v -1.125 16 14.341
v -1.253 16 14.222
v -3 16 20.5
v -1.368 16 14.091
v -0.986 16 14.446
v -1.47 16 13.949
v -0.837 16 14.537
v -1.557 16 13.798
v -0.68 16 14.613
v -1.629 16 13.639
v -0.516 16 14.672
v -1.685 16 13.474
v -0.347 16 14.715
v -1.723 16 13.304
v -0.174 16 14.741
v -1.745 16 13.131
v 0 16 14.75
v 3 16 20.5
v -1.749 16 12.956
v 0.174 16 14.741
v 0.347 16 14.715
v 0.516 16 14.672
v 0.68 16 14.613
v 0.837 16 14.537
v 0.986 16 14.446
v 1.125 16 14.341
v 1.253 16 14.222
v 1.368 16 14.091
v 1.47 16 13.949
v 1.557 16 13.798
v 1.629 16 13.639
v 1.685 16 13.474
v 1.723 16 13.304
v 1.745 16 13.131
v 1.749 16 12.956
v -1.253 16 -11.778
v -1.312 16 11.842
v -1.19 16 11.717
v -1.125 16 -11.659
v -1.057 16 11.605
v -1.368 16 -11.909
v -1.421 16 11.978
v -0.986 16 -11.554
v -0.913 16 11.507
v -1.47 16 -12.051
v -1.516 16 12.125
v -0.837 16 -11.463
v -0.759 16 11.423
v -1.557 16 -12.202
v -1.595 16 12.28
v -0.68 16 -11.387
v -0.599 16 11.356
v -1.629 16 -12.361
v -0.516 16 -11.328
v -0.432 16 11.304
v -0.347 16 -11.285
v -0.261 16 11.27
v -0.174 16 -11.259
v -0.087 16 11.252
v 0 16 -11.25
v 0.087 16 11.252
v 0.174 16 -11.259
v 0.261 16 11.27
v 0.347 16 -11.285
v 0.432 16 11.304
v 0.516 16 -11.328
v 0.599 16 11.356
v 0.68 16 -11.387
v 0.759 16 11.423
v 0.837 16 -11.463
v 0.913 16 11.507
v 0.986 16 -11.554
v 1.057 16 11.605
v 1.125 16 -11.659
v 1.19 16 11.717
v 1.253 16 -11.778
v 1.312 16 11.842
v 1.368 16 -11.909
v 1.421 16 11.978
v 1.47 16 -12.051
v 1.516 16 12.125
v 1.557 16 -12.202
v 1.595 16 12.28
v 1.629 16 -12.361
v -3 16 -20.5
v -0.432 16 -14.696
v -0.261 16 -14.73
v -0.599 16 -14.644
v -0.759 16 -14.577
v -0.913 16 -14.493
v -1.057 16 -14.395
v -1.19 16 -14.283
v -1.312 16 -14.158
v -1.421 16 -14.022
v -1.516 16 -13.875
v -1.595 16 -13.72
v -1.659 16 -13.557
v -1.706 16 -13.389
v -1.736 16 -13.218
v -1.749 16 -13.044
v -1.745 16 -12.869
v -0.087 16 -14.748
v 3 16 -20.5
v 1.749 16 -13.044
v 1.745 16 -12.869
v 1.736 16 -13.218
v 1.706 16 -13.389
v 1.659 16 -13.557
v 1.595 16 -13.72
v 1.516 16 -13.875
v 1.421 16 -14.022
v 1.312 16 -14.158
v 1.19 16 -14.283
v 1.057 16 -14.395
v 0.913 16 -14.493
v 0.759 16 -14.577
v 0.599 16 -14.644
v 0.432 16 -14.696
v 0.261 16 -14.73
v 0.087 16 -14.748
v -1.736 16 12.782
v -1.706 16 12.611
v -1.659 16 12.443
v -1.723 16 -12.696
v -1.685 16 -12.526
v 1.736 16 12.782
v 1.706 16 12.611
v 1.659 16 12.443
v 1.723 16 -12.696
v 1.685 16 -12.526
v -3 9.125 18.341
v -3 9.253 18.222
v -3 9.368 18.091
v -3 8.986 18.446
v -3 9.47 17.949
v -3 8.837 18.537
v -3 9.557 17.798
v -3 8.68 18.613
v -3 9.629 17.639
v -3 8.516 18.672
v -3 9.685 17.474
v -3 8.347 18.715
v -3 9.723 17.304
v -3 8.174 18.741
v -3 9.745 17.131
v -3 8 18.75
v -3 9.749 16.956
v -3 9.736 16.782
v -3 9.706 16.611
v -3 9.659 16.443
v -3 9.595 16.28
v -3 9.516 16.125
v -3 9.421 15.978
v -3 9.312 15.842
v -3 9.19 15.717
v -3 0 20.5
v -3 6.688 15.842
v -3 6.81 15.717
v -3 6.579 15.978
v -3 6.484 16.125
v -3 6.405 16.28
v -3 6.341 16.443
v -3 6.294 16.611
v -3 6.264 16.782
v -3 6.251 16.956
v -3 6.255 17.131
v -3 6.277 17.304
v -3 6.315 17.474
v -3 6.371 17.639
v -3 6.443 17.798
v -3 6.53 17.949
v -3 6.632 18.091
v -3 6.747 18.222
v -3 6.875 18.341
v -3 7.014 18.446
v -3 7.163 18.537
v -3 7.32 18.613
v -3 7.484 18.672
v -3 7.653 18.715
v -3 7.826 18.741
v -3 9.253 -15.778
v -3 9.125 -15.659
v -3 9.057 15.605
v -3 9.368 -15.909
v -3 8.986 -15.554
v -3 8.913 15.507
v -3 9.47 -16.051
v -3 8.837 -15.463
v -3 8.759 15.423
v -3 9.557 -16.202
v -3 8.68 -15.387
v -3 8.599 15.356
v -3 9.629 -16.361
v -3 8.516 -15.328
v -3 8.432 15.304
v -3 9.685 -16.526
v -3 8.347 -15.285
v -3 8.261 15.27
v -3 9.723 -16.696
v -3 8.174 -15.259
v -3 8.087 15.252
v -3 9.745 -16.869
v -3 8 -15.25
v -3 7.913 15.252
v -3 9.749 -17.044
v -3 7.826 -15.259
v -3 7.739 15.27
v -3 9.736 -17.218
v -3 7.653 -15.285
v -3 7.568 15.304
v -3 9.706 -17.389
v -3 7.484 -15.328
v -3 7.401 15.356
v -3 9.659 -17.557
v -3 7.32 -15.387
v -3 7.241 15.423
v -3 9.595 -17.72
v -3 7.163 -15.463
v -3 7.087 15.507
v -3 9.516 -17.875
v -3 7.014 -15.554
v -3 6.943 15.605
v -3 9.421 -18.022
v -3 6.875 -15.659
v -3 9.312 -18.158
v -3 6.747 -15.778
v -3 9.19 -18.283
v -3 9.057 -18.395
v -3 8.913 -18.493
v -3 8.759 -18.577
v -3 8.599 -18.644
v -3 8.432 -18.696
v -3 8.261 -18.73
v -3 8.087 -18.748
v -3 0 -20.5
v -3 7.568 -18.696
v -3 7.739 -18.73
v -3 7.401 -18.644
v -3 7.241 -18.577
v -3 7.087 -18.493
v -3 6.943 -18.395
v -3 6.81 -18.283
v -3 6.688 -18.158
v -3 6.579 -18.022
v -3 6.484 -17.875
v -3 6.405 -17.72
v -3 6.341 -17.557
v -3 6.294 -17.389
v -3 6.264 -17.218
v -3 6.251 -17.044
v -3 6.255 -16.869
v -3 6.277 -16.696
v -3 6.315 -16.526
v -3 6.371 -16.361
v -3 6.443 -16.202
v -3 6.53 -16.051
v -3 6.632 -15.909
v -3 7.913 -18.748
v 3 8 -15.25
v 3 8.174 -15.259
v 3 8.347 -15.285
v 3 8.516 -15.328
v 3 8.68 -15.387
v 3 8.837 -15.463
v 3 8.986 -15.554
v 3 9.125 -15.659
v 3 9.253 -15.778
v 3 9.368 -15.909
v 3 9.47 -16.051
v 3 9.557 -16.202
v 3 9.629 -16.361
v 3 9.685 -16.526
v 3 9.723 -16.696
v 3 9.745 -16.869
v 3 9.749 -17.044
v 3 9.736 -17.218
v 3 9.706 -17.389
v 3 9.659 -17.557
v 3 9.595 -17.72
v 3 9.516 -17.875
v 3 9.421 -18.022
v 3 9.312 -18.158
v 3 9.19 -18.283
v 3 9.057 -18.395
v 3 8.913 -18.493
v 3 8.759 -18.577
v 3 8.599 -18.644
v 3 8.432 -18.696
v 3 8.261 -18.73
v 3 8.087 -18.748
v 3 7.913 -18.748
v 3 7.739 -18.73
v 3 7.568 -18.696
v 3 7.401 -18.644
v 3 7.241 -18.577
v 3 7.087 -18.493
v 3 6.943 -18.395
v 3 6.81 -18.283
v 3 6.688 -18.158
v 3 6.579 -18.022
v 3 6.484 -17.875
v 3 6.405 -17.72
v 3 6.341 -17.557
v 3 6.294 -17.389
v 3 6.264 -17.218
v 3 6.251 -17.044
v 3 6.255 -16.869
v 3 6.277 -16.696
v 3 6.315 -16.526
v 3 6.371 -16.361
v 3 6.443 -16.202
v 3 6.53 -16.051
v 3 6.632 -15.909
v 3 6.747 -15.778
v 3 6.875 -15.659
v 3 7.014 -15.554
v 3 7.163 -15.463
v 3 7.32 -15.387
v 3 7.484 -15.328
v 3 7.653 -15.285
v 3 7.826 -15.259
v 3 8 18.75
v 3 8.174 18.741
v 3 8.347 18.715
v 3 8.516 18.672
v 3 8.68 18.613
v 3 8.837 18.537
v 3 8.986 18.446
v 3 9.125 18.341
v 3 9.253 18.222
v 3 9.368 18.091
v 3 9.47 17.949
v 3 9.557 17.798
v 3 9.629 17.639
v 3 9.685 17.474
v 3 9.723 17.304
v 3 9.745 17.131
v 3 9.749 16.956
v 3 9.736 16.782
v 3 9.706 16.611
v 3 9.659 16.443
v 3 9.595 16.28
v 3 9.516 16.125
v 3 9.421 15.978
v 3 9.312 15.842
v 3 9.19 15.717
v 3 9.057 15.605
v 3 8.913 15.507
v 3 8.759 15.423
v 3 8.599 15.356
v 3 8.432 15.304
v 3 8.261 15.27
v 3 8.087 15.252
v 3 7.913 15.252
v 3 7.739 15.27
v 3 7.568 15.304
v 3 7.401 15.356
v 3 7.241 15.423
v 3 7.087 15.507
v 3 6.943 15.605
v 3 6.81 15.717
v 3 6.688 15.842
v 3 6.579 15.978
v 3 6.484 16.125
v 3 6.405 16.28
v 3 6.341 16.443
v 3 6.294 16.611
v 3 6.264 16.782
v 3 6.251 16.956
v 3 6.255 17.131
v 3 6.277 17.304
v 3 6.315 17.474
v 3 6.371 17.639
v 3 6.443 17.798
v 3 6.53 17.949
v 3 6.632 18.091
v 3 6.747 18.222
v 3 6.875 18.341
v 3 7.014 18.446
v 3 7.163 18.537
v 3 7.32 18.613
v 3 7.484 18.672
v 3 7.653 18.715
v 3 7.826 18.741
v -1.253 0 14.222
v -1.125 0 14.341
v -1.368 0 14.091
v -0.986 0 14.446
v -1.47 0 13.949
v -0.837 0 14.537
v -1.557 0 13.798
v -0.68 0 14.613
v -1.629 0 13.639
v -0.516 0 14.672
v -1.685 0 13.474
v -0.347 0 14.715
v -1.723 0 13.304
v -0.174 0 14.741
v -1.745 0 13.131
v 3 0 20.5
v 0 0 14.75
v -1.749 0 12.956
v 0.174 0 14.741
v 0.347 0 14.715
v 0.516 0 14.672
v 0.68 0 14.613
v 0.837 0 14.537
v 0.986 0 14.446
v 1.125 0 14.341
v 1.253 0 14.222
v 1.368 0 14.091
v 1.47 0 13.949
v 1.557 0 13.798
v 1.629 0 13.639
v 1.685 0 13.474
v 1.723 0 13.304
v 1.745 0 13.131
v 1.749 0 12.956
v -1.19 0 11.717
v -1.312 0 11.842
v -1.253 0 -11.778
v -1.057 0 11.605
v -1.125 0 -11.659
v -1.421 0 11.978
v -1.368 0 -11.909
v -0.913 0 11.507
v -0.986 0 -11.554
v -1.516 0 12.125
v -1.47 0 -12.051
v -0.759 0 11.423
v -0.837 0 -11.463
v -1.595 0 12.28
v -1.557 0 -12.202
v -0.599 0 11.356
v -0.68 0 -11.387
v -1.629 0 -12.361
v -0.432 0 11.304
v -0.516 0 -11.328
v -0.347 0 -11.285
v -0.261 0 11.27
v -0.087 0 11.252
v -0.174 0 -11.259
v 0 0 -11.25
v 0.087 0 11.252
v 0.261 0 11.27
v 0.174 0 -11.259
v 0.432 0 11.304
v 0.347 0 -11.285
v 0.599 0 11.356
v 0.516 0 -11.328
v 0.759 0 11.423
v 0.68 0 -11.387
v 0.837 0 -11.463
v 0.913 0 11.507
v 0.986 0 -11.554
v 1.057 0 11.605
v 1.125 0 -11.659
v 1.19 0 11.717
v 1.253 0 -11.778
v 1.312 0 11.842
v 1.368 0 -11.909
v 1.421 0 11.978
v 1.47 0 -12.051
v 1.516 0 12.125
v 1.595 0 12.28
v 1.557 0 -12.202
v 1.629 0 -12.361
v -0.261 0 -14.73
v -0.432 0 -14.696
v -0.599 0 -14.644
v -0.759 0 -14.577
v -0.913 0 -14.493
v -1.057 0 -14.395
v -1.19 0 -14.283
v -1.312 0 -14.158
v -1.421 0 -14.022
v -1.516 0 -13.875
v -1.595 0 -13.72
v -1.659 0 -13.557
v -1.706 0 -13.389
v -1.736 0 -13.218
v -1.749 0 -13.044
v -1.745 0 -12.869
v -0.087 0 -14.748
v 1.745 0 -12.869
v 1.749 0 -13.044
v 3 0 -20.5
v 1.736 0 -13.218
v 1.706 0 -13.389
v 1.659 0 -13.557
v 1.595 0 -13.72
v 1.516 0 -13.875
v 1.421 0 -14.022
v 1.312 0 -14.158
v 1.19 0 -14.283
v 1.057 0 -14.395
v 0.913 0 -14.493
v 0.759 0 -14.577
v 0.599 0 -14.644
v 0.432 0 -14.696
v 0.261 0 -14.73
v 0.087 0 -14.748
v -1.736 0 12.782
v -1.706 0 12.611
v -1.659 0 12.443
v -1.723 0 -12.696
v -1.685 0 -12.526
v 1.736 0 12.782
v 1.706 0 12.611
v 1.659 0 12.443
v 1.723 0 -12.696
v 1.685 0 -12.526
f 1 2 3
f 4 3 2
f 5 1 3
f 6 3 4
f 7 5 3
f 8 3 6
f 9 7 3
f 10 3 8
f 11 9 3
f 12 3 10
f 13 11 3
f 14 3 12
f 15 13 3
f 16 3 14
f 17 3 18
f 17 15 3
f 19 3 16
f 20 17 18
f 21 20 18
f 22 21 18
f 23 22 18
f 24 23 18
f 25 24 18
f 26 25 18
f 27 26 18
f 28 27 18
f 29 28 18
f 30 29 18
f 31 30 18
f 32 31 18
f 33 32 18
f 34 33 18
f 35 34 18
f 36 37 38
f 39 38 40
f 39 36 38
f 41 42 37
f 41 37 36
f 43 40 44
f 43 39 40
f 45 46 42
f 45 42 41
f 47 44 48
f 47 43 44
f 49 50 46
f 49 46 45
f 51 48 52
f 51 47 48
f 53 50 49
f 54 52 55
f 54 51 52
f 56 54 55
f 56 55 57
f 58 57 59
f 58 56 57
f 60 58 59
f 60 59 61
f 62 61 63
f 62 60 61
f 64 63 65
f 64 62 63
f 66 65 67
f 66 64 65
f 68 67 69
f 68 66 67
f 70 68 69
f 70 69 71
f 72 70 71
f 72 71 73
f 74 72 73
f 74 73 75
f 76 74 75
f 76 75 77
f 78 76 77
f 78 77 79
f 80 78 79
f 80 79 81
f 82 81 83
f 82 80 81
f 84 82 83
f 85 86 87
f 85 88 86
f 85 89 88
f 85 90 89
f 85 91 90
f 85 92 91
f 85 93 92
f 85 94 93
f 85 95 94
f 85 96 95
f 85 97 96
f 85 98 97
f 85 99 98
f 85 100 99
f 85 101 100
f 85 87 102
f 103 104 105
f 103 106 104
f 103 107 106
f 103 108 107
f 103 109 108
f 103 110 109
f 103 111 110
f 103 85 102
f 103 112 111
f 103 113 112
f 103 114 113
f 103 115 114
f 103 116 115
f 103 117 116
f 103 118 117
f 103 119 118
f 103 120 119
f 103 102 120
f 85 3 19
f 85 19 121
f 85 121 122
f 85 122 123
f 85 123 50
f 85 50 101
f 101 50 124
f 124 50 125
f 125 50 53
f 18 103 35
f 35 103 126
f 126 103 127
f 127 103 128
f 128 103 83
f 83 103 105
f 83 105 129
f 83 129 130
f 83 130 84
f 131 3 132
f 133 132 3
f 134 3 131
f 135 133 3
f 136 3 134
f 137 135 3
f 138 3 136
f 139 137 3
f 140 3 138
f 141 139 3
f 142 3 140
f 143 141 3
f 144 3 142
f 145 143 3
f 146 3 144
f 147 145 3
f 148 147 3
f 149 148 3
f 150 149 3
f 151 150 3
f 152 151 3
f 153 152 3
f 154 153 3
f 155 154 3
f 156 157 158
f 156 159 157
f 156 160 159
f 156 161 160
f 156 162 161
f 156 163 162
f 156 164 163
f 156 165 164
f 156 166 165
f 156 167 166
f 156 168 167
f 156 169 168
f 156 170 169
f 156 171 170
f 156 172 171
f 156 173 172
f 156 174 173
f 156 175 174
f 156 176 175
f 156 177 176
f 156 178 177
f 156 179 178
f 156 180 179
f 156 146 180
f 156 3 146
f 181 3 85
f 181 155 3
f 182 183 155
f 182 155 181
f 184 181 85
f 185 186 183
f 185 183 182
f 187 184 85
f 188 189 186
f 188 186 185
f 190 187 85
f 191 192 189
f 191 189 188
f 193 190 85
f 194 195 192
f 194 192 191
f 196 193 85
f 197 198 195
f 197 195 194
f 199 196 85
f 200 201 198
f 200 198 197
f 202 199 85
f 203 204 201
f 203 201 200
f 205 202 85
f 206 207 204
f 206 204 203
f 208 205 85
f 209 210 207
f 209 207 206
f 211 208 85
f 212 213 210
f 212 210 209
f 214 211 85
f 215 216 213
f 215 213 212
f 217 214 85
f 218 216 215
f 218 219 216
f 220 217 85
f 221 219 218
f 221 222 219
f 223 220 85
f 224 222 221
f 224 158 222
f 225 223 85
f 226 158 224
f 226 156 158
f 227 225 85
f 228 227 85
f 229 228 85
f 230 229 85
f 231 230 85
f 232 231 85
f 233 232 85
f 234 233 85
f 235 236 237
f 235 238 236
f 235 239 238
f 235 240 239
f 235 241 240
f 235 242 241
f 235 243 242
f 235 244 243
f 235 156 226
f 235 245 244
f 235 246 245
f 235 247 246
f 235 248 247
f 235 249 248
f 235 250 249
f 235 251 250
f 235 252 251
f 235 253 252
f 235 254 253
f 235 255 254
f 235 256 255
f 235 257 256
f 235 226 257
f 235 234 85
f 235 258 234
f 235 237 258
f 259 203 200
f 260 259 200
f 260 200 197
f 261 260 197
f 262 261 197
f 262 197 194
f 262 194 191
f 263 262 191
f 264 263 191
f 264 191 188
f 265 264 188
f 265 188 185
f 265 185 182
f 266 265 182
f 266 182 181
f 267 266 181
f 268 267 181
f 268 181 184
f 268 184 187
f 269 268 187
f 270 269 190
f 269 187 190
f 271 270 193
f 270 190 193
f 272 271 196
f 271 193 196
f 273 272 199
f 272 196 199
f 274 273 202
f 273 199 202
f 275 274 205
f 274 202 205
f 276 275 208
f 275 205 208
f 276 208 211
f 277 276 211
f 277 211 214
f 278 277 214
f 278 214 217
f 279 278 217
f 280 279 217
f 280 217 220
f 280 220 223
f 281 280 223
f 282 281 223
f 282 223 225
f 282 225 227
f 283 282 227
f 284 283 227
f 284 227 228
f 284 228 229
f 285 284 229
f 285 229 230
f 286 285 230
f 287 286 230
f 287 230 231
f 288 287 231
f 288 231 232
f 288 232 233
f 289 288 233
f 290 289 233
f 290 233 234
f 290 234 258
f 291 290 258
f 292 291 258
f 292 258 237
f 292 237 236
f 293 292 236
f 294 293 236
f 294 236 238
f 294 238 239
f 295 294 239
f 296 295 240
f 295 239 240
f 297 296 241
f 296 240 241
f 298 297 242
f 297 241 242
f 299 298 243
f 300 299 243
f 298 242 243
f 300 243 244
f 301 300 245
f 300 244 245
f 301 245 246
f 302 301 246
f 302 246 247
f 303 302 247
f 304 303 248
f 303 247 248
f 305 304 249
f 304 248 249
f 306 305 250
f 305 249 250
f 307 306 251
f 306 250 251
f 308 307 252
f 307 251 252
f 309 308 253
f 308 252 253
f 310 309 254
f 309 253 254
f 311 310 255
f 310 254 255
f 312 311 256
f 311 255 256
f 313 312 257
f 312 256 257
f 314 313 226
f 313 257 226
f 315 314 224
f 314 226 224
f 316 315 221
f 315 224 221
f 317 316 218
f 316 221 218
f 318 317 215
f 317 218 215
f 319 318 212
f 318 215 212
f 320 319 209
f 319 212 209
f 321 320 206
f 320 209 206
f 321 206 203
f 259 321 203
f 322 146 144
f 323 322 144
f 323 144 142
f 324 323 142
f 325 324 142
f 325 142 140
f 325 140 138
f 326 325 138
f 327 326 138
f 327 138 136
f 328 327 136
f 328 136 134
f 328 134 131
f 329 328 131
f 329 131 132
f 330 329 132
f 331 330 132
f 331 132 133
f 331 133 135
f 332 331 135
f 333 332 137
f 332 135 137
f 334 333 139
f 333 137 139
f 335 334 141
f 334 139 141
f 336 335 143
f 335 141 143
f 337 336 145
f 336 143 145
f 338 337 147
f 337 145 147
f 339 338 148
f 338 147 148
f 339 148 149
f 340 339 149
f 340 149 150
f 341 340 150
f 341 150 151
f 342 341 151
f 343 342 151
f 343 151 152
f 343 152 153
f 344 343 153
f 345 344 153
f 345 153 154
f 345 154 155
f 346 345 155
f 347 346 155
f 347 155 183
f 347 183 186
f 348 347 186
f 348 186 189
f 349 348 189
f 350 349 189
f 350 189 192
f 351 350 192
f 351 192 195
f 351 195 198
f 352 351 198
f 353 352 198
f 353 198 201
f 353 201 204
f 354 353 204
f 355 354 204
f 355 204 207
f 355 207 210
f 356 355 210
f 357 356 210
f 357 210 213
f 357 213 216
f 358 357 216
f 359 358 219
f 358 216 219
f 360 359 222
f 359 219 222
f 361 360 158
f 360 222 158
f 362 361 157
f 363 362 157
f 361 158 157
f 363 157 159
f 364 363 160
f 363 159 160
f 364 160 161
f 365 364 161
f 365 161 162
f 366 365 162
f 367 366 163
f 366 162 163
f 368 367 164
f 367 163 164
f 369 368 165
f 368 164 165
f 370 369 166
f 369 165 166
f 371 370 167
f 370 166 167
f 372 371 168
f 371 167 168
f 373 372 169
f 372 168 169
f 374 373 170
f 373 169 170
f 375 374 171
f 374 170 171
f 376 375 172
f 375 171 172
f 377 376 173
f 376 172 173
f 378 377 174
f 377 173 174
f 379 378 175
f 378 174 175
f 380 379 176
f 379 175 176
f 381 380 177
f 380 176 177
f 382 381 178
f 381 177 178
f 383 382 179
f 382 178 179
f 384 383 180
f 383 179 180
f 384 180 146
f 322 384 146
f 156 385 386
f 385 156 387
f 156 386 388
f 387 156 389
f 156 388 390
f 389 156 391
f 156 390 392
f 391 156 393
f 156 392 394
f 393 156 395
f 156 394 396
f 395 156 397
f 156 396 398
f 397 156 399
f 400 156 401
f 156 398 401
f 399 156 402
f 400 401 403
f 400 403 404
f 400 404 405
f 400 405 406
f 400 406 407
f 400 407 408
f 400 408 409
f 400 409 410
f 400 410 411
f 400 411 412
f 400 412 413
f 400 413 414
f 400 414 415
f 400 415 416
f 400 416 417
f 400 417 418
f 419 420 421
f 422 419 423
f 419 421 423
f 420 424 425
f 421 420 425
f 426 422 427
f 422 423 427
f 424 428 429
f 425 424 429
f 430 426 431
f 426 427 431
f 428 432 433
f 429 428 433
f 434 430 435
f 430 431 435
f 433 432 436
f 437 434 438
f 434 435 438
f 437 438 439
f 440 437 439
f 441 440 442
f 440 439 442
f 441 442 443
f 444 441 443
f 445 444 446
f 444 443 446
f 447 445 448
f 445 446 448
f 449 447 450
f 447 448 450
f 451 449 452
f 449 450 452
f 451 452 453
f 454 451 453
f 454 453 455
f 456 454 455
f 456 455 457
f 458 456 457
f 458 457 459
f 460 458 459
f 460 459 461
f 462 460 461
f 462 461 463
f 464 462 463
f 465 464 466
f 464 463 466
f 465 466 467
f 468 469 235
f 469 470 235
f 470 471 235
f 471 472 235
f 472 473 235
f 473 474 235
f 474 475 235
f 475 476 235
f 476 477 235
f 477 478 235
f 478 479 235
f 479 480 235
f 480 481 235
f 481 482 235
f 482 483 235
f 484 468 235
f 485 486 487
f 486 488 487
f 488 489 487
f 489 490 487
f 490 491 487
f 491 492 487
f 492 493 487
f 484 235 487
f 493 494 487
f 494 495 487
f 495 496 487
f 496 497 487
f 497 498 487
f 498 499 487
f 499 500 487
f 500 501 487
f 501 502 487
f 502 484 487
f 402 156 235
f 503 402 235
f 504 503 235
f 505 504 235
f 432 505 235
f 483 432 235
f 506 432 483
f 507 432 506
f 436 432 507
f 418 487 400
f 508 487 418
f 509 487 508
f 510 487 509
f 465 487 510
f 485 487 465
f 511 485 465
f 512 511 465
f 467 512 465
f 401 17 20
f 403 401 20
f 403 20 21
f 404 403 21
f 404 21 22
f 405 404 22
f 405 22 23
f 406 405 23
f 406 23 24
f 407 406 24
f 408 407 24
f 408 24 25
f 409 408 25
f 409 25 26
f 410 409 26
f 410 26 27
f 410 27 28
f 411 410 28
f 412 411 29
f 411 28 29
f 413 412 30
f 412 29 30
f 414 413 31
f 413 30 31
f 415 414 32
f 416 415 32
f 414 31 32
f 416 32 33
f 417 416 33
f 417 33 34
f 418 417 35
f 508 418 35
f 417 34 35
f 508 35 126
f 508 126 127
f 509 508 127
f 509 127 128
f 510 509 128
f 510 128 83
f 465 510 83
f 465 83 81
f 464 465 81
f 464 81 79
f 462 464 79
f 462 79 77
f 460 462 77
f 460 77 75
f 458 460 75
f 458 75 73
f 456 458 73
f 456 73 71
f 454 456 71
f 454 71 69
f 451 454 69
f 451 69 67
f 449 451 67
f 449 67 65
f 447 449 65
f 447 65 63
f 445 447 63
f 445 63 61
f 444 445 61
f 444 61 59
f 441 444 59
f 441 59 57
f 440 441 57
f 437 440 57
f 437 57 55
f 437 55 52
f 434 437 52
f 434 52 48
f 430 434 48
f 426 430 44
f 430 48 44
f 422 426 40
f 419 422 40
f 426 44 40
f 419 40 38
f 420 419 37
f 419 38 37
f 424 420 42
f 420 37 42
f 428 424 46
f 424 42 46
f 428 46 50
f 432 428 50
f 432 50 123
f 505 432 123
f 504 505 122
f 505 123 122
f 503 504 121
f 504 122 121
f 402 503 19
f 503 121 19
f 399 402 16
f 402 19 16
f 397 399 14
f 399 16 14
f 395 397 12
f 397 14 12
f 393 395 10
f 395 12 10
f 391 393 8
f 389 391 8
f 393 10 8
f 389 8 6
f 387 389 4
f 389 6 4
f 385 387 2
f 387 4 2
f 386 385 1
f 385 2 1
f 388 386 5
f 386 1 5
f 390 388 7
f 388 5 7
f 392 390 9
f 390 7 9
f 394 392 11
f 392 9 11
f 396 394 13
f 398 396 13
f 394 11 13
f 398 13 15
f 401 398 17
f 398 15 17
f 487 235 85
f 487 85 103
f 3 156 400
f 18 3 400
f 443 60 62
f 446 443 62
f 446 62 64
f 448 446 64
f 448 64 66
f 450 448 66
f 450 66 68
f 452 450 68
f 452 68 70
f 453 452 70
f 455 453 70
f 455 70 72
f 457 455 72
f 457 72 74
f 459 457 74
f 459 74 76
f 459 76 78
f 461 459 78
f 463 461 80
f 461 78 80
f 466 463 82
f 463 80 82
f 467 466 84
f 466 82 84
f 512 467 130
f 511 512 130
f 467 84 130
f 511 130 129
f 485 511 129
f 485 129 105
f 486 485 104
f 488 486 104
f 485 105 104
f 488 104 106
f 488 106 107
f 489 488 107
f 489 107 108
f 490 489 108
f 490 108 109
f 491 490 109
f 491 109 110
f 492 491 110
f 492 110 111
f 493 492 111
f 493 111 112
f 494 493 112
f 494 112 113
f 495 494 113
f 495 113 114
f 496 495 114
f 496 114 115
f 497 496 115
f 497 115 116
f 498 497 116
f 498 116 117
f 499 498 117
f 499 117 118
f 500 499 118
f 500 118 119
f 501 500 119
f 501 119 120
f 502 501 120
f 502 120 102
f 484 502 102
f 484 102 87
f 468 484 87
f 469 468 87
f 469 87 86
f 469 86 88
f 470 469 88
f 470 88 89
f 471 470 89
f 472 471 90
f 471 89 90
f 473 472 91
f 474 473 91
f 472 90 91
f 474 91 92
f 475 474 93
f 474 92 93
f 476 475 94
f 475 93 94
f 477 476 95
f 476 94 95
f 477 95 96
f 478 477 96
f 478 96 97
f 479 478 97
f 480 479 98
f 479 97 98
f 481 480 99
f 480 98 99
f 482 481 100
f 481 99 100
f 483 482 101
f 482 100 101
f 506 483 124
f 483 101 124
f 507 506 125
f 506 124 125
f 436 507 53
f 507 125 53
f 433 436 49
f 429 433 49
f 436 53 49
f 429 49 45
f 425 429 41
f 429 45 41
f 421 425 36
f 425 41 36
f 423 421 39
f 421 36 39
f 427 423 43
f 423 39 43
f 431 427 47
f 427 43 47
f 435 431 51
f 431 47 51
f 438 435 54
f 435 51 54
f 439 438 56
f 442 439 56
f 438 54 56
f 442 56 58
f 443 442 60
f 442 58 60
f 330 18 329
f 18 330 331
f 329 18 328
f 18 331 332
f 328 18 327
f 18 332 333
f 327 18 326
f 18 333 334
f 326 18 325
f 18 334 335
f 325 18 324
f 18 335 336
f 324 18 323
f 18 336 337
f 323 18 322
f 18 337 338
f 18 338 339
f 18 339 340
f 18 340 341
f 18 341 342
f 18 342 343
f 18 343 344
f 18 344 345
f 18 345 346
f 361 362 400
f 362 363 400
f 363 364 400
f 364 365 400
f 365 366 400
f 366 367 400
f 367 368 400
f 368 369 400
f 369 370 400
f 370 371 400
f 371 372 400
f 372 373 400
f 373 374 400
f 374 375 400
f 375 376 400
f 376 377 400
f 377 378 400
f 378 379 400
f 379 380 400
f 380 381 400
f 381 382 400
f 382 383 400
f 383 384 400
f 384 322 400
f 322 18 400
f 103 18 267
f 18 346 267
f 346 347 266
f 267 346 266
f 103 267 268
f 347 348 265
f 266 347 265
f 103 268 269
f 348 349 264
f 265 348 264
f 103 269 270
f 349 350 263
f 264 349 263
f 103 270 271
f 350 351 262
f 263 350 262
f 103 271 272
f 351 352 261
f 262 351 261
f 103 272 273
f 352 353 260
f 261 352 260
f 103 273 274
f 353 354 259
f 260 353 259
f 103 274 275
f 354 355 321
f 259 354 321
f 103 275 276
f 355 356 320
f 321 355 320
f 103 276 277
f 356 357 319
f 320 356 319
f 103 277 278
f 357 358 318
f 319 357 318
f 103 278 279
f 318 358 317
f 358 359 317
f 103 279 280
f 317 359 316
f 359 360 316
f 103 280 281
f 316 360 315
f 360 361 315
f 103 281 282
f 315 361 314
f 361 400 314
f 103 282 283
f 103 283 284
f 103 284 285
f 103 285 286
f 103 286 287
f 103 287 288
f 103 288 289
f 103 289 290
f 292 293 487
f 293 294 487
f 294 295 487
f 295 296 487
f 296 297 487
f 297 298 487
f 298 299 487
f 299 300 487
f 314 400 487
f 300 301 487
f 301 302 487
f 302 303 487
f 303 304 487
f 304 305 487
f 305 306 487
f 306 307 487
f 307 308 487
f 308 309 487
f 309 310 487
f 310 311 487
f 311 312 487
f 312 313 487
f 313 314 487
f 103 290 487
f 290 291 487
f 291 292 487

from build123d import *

# Parameters (mm, degrees)
SKETCH_1_W          = 6
SKETCH_1_H          = 41
EXTRUDE_1_DEPTH     = 16
SKETCH_2_R          = 1.75
CUT_EXTRUDE_1_DEPTH = 27.177280225
SKETCH_3_R          = 1.75
CUT_EXTRUDE_2_DEPTH = 27.68801229


with BuildPart() as part:
    # 草图1 → 凸台-拉伸1 (new body)
    with BuildSketch(Plane(origin=(0, 0, 0), x_dir=(1, 0, 0), z_dir=(0, 1, 0))):
        Rectangle(SKETCH_1_W, SKETCH_1_H)
    extrude(amount=EXTRUDE_1_DEPTH)

    # 草图2 → 切除-拉伸1 (cut, through all)
    with BuildSketch(Plane(origin=(0, 16, 0), x_dir=(1, 0, 0), z_dir=(0, 1, 0))):
        with Locations(Location((0, 13, 0), (0, 0, 270))):
            Circle(SKETCH_2_R)
        with Locations(Location((0, -13, 0), (0, 0, 270))):
            Circle(SKETCH_2_R)
    extrude(amount=-CUT_EXTRUDE_1_DEPTH, mode=Mode.SUBTRACT)

    # 草图3 → 切除-拉伸2 (cut, through all)
    with BuildSketch(Plane.ZY.offset(3)):
        with Locations((-17, 8)):
            Circle(SKETCH_3_R)
        with Locations((17, 8)):
            Circle(SKETCH_3_R)
    extrude(amount=-CUT_EXTRUDE_2_DEPTH, mode=Mode.SUBTRACT)


solid = part.part
